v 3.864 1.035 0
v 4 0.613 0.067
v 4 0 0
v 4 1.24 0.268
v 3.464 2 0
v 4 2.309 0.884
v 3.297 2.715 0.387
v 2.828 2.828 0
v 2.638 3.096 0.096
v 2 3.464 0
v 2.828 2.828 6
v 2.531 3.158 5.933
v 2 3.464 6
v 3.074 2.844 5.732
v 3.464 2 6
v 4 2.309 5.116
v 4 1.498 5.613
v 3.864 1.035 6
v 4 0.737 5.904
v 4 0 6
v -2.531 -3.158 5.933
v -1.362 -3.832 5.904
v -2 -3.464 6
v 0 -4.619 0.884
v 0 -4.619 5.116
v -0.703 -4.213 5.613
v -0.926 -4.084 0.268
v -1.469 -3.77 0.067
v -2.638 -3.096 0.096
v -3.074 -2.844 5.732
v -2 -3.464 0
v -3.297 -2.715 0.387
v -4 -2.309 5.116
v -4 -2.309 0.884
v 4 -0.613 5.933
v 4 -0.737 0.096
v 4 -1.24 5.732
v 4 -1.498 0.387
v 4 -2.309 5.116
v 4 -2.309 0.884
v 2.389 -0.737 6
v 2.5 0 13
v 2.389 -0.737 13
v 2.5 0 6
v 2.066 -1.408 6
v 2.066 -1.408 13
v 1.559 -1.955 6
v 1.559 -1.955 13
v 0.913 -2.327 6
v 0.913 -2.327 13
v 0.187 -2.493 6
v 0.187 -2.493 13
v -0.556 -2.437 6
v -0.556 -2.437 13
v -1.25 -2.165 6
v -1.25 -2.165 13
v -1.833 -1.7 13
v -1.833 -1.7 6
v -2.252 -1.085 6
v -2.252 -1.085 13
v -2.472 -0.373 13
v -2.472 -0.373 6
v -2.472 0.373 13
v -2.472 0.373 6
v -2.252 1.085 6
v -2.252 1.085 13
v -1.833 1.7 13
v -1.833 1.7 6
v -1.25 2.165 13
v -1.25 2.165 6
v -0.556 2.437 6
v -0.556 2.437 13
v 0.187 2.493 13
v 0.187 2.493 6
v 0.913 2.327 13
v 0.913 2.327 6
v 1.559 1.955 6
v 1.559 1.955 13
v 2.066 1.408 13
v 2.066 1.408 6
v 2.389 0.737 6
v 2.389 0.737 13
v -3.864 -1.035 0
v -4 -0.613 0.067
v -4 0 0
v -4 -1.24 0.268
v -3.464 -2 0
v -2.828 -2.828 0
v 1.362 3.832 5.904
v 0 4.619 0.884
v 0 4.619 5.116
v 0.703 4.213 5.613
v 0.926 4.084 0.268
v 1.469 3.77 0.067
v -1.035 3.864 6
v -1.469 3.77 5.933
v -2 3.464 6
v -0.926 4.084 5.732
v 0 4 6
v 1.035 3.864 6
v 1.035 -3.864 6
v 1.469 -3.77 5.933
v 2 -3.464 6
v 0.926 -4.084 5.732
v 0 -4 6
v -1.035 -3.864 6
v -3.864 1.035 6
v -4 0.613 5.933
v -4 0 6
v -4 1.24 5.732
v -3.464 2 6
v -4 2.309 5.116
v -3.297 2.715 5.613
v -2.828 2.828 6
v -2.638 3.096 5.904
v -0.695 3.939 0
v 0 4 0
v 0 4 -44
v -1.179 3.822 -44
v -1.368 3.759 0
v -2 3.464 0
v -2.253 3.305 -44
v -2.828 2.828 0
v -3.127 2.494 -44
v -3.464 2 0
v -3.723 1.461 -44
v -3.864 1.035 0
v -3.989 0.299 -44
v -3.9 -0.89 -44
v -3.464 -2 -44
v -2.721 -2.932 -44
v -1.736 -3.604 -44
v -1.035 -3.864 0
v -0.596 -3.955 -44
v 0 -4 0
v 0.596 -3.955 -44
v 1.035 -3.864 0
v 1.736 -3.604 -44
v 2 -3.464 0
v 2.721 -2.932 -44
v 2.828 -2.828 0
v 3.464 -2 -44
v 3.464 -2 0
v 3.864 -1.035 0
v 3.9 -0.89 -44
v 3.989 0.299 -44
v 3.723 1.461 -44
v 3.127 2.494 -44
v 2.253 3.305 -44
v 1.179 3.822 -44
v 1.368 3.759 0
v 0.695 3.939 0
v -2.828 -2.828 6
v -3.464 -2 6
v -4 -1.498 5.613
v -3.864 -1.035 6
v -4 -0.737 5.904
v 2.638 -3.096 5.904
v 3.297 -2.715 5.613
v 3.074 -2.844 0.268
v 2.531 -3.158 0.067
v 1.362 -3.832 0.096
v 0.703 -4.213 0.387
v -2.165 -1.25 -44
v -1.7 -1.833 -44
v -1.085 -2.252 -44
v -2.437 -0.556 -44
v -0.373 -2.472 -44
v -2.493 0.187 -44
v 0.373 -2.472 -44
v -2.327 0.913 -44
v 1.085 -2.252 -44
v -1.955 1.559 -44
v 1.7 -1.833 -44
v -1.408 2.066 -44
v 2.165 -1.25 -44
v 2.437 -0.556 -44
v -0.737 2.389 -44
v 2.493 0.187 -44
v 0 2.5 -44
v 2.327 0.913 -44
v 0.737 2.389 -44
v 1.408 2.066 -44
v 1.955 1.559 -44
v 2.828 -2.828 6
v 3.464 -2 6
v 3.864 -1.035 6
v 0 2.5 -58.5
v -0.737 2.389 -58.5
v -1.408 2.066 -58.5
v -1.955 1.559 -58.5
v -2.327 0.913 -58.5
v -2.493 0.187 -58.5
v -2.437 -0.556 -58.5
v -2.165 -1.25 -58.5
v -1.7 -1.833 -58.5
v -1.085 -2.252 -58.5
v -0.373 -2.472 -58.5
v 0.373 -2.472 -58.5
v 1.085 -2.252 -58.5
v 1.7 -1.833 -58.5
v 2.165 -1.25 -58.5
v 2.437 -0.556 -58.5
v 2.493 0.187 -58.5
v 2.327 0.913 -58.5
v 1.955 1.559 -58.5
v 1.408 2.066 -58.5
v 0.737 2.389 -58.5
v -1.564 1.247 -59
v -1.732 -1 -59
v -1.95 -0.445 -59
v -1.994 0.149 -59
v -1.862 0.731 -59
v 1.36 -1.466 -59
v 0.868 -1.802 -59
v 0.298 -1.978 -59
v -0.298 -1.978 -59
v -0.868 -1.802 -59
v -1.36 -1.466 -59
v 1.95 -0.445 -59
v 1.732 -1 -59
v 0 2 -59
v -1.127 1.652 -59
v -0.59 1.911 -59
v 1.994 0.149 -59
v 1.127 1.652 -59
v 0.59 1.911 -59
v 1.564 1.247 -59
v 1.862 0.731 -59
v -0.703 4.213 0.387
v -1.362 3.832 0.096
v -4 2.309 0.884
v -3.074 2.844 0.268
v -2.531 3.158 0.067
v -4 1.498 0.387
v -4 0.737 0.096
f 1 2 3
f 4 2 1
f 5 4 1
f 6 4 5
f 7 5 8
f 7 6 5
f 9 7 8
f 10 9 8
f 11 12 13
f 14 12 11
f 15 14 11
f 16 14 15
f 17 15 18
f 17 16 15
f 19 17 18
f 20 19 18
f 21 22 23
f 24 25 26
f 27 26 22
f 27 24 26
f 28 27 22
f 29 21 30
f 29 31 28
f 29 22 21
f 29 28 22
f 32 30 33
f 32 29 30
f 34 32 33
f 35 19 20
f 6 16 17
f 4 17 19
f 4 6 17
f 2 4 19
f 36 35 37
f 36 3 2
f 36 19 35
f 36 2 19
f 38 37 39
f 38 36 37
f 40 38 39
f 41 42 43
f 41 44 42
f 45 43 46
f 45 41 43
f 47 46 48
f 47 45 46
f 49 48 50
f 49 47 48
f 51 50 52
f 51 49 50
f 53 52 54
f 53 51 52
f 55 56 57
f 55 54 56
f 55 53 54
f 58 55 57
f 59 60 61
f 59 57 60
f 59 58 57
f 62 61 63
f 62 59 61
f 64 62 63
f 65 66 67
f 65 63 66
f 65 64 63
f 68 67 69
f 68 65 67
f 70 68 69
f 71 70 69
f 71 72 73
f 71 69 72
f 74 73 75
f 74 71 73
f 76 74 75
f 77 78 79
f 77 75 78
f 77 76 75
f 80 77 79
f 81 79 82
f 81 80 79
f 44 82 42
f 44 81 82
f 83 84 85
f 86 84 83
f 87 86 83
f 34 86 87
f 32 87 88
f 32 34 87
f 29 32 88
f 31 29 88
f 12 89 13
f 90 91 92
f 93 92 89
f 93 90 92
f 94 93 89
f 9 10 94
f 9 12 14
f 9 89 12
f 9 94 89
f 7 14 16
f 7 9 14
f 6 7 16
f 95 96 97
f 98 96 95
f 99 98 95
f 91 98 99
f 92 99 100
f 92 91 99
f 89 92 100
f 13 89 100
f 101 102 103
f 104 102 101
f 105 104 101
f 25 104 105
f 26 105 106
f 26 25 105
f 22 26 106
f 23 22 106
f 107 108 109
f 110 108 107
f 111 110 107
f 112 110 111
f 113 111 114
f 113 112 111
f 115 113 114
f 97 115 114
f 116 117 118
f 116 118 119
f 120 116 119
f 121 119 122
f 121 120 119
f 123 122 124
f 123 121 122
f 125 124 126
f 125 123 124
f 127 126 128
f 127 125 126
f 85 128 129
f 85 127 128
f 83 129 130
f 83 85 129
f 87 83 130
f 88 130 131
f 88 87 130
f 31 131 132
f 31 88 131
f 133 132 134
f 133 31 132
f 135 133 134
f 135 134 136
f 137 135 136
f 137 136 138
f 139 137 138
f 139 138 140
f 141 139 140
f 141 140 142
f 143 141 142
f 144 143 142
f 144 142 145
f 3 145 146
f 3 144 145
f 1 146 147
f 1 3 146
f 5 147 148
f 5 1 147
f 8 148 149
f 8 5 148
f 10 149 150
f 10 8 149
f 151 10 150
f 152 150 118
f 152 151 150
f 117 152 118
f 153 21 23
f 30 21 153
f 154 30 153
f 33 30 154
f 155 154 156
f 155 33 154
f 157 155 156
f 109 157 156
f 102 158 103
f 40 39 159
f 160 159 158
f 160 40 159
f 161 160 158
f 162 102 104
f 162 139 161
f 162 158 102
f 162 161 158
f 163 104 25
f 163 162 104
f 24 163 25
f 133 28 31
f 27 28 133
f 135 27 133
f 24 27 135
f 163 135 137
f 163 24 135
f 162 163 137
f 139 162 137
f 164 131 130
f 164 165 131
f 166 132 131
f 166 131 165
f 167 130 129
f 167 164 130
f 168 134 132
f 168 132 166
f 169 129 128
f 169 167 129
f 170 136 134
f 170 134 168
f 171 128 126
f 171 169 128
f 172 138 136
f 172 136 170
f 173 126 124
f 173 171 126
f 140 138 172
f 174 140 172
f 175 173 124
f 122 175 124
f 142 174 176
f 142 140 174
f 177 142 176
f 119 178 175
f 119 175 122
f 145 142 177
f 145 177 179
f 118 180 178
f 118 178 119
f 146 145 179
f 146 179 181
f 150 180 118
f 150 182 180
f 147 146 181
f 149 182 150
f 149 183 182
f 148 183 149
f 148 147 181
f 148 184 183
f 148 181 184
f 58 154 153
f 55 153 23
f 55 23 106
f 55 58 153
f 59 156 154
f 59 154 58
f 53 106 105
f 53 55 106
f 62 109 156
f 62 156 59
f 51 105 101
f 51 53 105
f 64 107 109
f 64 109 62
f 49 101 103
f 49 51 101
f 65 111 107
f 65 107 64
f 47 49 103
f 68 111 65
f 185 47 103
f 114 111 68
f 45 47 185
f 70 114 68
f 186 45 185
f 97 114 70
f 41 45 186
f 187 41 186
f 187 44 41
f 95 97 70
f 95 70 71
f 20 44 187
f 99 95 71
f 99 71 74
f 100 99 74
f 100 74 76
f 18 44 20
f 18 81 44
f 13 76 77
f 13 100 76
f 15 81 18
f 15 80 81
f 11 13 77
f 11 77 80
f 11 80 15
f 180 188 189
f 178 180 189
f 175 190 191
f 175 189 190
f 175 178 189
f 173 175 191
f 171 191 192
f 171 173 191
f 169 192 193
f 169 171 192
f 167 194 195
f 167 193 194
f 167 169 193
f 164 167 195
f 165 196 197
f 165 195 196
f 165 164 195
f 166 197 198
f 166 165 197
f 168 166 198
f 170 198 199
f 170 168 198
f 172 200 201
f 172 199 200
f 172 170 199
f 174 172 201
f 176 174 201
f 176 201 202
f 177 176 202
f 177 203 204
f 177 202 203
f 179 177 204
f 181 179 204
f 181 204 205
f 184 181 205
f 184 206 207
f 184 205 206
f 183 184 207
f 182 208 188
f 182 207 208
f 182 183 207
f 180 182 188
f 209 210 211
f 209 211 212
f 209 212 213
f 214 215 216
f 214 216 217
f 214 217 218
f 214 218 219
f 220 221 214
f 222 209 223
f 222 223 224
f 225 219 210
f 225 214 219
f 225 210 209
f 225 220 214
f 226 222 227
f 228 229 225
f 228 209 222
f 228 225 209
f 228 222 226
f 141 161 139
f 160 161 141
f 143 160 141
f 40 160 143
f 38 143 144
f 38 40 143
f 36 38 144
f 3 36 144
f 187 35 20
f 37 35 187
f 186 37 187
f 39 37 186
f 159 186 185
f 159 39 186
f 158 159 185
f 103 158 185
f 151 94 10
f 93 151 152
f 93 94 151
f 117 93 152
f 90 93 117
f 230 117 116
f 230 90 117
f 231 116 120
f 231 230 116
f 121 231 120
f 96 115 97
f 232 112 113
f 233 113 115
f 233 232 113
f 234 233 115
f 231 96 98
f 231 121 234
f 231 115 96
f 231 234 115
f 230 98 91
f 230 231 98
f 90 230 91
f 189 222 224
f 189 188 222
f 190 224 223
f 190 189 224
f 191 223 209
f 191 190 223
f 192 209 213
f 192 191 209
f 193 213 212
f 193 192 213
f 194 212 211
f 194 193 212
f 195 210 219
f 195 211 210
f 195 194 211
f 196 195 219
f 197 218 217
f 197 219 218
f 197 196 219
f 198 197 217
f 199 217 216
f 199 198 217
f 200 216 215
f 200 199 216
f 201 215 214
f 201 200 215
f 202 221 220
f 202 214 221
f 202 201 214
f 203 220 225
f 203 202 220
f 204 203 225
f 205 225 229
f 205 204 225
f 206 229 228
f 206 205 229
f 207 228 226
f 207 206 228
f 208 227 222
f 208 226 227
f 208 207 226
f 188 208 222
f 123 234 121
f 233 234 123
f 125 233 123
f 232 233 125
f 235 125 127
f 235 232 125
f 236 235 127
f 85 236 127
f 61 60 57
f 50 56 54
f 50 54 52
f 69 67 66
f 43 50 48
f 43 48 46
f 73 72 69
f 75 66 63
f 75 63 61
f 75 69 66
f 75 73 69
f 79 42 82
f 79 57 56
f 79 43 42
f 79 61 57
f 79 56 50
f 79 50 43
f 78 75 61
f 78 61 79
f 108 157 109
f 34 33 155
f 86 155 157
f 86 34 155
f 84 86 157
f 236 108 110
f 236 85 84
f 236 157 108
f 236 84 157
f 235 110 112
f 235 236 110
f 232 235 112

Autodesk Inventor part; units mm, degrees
ref_plane "YZ Plane" through (0, 0, 0) normal (1, 0, 0) x (0, 1, 0)
ref_plane "XZ Plane" through (0, 0, 0) normal (0, 1, 0) x (-1, 0, 0)
ref_plane "XY Plane" through (0, 0, 0) normal (0, 0, 1) x (1, 0, 0)
sketch "Sketch1" plane through (0, 0, 0) normal (0, 0, 1) x (1, 0, 0)
  circle A0 centre (0, 0) radius 4
  line L0 (-4, 2.3094) -> (0, 4.6188)
  line L1 (0, 4.6188) -> (4, 2.3094)
  line L2 (4, 2.3094) -> (4, -2.3094)
  line L3 (4, -2.3094) -> (0, -4.6188)
  line L4 (0, -4.6188) -> (-4, -2.3094)
  line L5 (-4, -2.3094) -> (-4, 2.3094)
  point P0 (-4, 0)
  dimension "d0" = 8
extrude "Extrusion1" add sketch "Sketch1" along normal blind 6
sketch "Sketch2" plane through (0, 0, 6) normal (0, 0, 1) x (1, 0, 0)
  circle A0 centre (0, 0) radius 4 projected
extrude "Extrusion2" cut sketch "Sketch2" against normal blind 6 draft 35 keep common part
extrude "Extrusion3" cut sketch "Sketch1" along normal blind 6 draft 35 contours A0 keep common part
sketch "Sketch3" plane through (0, 0, 0) normal (1, 0, 0) x (0, 1, 0)
  line L0 (0, 0) -> (-3.4641, 0) projected
  line L1 (0, 0) -> (0, -59)
  line L2 (0, -59) -> (2, -59)
  line L3 (2.5, -58.5) -> (2.5, -44)
  line L4 (2.5, -44) -> (4, -44)
  line L5 (4, -44) -> (4, 0)
  line L6 (0, 0) -> (27.6878, 0) construction
  line L7 (3.4641, 0) -> (0, 0) projected
  line L8 (4, 0) -> (0, 0)
  line L9 (2.5, -58.5) -> (2, -59)
  point P0 (2.5, -59)
  dimension "d7" = 4
  dimension "d8" = 2.5
  dimension "d9" = 44
  dimension "d10" = 15
  dimension "d11" = 0.5
  dimension "d12" = 0.5
revolve "Revolution1" add sketch "Sketch3" angle 360 about axis through (0, 0, 0) along (0, 0, -1)
sketch "Sketch4" plane through (0, 0, 6) normal (0, 0, 1) x (1, 0, 0)
  circle A0 centre (0, 0) radius 2 projected
  circle A1 centre (0, 0) radius 2.5
  point P0 (0, 0)
  dimension "d14" = 5
extrude "Extrusion4" add sketch "Sketch4" along normal blind 7 contours A0 | A1
thread "Thread1" size "M5x0.8" class "6g" standard "ANSI Metric M Profile" full length
thread "Thread2" size "M5x0.8" class "6g" standard "ANSI Metric M Profile" full length
equation "\"d12\" = d11"
properties part number "Component 9 (Suspension Spacer)"
